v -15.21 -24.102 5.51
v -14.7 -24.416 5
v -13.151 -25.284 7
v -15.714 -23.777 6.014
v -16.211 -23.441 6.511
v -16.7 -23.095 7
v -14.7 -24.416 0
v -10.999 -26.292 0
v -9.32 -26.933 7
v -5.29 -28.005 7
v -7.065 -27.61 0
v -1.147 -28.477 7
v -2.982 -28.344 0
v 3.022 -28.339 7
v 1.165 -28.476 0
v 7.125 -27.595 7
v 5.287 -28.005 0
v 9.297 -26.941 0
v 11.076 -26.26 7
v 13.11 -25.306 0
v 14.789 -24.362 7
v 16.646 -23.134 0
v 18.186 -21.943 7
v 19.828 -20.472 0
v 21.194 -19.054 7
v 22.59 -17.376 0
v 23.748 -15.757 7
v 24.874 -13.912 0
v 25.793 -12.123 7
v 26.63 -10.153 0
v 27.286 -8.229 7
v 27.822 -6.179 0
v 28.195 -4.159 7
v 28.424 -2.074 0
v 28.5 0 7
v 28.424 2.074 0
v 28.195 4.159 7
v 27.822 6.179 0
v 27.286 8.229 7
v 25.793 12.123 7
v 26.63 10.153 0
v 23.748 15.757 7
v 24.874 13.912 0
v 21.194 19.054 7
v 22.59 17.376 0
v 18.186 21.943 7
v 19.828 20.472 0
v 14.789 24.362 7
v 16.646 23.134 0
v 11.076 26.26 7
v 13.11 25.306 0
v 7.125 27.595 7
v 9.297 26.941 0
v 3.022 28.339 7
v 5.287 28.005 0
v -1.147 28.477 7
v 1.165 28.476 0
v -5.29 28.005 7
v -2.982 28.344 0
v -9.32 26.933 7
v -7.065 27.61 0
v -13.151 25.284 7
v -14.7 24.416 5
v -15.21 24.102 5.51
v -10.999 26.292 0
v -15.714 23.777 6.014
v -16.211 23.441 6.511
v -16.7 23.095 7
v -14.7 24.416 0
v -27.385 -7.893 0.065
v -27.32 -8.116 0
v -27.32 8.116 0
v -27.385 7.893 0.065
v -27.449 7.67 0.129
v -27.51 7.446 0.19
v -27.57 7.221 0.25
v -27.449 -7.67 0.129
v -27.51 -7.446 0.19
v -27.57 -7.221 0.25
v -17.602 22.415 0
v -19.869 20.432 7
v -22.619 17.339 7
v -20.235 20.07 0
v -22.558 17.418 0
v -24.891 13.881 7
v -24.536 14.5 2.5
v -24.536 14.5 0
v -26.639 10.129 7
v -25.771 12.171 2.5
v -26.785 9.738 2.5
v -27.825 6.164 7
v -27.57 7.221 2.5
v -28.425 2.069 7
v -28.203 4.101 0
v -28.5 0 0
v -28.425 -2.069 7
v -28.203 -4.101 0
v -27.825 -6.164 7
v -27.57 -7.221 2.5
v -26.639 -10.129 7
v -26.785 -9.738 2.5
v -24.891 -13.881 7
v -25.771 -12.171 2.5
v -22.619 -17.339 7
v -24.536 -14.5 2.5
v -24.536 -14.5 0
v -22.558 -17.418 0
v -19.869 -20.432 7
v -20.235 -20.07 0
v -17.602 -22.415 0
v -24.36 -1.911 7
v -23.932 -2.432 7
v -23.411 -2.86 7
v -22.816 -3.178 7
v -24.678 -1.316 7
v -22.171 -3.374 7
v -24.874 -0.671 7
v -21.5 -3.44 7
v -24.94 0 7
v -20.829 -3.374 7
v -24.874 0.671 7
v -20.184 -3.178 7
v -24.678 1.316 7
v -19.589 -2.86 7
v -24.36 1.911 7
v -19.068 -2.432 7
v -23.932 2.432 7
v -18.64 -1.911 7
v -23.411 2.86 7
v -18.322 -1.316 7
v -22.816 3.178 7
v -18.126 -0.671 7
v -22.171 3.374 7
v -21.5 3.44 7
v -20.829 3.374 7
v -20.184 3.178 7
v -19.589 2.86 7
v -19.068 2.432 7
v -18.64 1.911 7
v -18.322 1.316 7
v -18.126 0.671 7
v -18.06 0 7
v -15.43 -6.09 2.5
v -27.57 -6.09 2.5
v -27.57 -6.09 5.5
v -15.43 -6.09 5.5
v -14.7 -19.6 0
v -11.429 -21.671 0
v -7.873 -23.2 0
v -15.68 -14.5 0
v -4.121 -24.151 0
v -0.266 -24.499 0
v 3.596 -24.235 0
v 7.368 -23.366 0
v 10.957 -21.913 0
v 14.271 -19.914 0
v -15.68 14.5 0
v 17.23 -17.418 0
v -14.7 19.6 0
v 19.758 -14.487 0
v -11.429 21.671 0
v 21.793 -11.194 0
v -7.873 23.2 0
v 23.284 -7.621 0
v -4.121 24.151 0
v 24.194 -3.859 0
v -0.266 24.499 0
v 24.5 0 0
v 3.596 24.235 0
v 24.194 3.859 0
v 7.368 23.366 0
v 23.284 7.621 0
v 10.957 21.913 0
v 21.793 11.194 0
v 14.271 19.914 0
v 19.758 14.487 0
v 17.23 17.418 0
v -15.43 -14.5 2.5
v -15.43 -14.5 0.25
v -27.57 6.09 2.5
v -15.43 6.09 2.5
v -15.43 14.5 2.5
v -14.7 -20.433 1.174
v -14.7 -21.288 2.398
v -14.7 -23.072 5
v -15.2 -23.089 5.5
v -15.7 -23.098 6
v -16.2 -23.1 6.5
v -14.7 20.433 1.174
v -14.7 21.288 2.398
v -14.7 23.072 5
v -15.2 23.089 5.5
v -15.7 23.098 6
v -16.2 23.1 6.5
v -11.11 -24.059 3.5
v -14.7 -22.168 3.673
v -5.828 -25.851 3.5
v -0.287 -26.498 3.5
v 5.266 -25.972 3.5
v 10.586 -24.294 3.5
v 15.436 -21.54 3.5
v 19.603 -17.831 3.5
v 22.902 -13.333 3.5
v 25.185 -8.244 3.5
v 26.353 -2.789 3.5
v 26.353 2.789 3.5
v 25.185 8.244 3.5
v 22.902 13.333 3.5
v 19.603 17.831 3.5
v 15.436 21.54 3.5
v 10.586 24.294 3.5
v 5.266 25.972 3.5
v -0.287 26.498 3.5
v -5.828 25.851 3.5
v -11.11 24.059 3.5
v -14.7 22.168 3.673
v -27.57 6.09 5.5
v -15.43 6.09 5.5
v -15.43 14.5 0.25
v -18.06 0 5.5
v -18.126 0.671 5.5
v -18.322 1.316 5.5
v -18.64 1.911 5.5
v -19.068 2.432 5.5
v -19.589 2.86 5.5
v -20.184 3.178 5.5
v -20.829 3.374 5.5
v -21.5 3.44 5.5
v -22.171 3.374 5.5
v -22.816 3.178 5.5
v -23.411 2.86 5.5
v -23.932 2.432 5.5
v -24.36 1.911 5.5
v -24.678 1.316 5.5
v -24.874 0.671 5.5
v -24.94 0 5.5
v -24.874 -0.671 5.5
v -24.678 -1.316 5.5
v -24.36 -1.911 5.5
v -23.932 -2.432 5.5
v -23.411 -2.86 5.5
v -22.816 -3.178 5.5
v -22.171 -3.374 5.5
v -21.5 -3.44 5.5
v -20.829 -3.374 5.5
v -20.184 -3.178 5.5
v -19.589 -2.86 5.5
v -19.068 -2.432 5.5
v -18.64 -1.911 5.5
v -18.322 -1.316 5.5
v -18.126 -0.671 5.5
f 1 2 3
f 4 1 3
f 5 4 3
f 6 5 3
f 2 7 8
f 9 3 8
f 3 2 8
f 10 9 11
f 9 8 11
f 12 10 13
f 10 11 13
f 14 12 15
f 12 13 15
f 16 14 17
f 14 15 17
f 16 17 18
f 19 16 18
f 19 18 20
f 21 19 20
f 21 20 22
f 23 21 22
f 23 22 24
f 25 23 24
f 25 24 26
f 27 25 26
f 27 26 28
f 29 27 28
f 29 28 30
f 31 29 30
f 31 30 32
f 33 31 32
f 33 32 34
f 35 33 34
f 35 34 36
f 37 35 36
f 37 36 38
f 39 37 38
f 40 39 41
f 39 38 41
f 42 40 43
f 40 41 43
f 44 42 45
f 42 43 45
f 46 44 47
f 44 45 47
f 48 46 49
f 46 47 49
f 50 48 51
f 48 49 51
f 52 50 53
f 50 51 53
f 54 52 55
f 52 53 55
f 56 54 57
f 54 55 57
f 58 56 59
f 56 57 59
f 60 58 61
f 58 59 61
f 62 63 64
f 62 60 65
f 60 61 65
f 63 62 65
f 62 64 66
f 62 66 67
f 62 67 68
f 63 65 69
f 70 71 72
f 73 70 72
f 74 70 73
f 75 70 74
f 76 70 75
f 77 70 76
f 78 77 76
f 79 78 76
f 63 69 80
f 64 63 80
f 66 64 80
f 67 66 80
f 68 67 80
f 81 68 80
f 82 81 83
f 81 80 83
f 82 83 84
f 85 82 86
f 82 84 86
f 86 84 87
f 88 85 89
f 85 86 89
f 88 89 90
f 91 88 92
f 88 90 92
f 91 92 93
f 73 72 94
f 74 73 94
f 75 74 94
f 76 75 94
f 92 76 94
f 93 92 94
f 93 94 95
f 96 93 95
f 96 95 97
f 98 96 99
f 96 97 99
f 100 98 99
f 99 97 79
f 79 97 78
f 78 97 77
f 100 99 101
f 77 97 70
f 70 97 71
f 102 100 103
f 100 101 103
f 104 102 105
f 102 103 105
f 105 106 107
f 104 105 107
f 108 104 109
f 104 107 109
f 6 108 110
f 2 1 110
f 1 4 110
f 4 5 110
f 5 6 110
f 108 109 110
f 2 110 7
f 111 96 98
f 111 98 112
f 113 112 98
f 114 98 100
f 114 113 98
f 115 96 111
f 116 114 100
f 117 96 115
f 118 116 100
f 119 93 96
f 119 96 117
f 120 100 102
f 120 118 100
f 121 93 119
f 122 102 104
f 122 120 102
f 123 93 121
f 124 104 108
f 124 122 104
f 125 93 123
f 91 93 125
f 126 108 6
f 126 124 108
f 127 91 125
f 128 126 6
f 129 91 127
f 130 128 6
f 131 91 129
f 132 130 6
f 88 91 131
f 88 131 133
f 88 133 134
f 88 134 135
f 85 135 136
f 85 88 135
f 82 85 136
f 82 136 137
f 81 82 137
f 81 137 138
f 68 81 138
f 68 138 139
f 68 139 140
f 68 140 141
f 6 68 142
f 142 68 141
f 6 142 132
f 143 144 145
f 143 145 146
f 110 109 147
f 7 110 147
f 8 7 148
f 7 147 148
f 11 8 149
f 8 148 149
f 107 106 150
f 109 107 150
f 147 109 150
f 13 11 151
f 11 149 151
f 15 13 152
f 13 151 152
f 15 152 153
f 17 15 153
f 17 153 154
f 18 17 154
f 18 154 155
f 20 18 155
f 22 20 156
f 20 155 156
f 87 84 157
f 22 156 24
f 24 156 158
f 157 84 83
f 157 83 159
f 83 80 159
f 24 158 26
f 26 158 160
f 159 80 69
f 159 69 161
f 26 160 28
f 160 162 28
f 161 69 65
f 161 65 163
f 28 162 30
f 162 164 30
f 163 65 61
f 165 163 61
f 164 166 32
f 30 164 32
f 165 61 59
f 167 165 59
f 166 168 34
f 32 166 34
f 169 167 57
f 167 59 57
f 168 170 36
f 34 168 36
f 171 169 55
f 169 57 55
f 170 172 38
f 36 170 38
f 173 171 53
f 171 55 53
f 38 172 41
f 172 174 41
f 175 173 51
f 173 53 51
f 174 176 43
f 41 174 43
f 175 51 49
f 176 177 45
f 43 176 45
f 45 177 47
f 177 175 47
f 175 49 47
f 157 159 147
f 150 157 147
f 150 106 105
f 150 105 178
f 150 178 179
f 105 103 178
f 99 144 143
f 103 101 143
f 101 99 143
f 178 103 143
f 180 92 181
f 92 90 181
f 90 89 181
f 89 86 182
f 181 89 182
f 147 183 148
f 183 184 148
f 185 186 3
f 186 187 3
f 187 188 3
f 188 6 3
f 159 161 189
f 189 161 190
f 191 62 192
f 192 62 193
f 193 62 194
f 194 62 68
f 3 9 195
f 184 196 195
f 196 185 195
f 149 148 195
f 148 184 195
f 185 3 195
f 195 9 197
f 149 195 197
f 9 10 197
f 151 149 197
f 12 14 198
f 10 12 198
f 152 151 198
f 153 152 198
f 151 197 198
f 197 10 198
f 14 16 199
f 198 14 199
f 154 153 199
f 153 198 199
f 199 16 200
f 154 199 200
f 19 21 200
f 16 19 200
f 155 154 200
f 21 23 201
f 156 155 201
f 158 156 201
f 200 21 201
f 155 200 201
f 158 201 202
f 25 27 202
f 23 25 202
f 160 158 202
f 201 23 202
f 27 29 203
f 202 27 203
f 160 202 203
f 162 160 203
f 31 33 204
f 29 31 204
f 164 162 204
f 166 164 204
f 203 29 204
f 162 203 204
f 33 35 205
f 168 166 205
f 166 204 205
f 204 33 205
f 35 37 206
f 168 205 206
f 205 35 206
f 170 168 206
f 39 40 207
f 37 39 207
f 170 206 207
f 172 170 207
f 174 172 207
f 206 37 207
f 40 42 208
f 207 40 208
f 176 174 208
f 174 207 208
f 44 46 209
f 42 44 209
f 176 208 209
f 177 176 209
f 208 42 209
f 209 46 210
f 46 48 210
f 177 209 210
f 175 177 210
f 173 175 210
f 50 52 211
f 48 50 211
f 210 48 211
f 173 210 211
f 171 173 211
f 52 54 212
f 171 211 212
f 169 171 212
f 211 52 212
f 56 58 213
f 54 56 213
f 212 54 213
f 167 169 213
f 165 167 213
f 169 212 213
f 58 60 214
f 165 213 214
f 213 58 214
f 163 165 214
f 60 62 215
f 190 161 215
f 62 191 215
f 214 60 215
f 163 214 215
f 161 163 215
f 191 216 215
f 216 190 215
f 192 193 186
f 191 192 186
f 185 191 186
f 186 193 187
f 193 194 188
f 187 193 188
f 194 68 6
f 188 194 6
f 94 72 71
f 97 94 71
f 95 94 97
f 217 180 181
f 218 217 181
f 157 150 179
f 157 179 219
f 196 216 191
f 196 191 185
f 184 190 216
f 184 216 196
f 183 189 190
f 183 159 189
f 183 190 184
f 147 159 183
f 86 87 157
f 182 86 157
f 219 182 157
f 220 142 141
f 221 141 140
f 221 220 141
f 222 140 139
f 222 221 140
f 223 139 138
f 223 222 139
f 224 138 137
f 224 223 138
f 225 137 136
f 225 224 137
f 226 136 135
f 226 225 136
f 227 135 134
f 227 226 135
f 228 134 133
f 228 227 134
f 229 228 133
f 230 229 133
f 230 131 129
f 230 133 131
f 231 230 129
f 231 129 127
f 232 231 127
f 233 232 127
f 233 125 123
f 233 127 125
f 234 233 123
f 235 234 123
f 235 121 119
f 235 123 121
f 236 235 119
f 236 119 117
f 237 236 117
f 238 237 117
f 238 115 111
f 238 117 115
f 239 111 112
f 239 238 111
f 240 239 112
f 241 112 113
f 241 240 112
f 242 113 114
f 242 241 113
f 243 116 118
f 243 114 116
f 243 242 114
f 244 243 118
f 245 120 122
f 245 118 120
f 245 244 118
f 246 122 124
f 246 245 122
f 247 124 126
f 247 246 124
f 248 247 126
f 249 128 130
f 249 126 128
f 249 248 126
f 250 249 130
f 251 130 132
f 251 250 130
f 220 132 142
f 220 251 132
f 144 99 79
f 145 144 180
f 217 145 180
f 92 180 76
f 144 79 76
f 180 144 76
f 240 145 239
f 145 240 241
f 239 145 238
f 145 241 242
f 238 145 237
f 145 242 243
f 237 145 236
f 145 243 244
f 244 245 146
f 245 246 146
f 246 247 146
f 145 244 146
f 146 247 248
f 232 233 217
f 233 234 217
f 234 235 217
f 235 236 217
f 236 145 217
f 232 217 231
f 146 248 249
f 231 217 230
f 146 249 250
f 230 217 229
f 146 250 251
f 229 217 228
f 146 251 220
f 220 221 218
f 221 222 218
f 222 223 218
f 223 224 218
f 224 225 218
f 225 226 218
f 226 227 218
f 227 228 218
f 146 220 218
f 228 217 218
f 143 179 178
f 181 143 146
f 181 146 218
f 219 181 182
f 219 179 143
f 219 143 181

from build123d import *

# Parameters (mm, degrees)
SKETCH011_W     = 12.14
SKETCH011_H     = 29
PAD009_DEPTH    = 2.5
CHAMFER002_SIZE = 0.25
SKETCH012_W     = 12.14
SKETCH012_H     = 12.18
PAD010_DEPTH    = 3
SKETCH013_R     = 3.44
PAD011_DEPTH    = 4
PAD008_DEPTH    = 7
CHAMFER001_SIZE = 2
SKETCH004_R     = 28.5
SKETCH004_R_2   = 24.5
PAD002_DEPTH    = 7


with BuildPart() as pad_enc_shaft_cutout:
    # Sketch011 → Pad009 (new body)
    with BuildSketch(Plane.XY):
        with Locations((-21.5, 0)):
            Rectangle(SKETCH011_W, SKETCH011_H)
    extrude(amount=PAD009_DEPTH)

    # Chamfer002
    chamfer002_edges = [pad_enc_shaft_cutout.edges().sort_by_distance(p)[0] for p in [
        (-15.43, 0, 0),
        (-27.57, 0, 0),
    ]]
    chamfer(chamfer002_edges, length=CHAMFER002_SIZE)

    # Sketch012 → Pad010 (new body)
    with BuildSketch(Plane.XY.offset(2.5)):
        with Locations((-21.5, 0)):
            Rectangle(SKETCH012_W, SKETCH012_H)
    extrude(amount=PAD010_DEPTH)

    # Sketch013 → Pad011 (new body)
    with BuildSketch(Plane.XY.offset(5.5)):
        with Locations((-21.5, 0)):
            Circle(SKETCH013_R)
    extrude(amount=PAD011_DEPTH)


with BuildPart() as chamfer_left_mount:
    # Sketch010 → Pad008 (new body)
    with BuildSketch(Plane.XY):
        with BuildLine():
            ThreePointArc((-14.7, 24.416388), (-28.5, 0), (-14.7, -24.416388))
            Line((-14.7, 24.416388), (-14.7, -24.416388))
        make_face()
    extrude(amount=PAD008_DEPTH)

    # Chamfer001
    chamfer001_edges = [chamfer_left_mount.edges().sort_by_distance(p)[0] for p in [
        (-14.7, 0, 7),
    ]]
    chamfer(chamfer001_edges, length=CHAMFER001_SIZE)


with BuildPart() as cone:
    # Cone → Cone (revolve)
    with BuildSketch(Plane.XZ):
        Polygon((0, 0), (24.5, 0), (28.5, 7), (0, 7), align=None)
    revolve(axis=Axis((0, 0, 0), (0, 0, 1)))


with BuildPart() as cut_left_mount_encoder:
    # Sketch004 → Pad002 (new body)
    with BuildSketch(Plane.XY):
        Circle(SKETCH004_R)
        Circle(SKETCH004_R_2, mode=Mode.SUBTRACT)
    extrude(amount=PAD002_DEPTH)

    # Cut: cut Cone
    add(cone.part, mode=Mode.SUBTRACT)

    # Fusion: union Chamfer (left mount)
    add(chamfer_left_mount.part)

    # Cut001: cut Pad (enc shaft cutout)
    add(pad_enc_shaft_cutout.part, mode=Mode.SUBTRACT)


solid = cut_left_mount_encoder.part
